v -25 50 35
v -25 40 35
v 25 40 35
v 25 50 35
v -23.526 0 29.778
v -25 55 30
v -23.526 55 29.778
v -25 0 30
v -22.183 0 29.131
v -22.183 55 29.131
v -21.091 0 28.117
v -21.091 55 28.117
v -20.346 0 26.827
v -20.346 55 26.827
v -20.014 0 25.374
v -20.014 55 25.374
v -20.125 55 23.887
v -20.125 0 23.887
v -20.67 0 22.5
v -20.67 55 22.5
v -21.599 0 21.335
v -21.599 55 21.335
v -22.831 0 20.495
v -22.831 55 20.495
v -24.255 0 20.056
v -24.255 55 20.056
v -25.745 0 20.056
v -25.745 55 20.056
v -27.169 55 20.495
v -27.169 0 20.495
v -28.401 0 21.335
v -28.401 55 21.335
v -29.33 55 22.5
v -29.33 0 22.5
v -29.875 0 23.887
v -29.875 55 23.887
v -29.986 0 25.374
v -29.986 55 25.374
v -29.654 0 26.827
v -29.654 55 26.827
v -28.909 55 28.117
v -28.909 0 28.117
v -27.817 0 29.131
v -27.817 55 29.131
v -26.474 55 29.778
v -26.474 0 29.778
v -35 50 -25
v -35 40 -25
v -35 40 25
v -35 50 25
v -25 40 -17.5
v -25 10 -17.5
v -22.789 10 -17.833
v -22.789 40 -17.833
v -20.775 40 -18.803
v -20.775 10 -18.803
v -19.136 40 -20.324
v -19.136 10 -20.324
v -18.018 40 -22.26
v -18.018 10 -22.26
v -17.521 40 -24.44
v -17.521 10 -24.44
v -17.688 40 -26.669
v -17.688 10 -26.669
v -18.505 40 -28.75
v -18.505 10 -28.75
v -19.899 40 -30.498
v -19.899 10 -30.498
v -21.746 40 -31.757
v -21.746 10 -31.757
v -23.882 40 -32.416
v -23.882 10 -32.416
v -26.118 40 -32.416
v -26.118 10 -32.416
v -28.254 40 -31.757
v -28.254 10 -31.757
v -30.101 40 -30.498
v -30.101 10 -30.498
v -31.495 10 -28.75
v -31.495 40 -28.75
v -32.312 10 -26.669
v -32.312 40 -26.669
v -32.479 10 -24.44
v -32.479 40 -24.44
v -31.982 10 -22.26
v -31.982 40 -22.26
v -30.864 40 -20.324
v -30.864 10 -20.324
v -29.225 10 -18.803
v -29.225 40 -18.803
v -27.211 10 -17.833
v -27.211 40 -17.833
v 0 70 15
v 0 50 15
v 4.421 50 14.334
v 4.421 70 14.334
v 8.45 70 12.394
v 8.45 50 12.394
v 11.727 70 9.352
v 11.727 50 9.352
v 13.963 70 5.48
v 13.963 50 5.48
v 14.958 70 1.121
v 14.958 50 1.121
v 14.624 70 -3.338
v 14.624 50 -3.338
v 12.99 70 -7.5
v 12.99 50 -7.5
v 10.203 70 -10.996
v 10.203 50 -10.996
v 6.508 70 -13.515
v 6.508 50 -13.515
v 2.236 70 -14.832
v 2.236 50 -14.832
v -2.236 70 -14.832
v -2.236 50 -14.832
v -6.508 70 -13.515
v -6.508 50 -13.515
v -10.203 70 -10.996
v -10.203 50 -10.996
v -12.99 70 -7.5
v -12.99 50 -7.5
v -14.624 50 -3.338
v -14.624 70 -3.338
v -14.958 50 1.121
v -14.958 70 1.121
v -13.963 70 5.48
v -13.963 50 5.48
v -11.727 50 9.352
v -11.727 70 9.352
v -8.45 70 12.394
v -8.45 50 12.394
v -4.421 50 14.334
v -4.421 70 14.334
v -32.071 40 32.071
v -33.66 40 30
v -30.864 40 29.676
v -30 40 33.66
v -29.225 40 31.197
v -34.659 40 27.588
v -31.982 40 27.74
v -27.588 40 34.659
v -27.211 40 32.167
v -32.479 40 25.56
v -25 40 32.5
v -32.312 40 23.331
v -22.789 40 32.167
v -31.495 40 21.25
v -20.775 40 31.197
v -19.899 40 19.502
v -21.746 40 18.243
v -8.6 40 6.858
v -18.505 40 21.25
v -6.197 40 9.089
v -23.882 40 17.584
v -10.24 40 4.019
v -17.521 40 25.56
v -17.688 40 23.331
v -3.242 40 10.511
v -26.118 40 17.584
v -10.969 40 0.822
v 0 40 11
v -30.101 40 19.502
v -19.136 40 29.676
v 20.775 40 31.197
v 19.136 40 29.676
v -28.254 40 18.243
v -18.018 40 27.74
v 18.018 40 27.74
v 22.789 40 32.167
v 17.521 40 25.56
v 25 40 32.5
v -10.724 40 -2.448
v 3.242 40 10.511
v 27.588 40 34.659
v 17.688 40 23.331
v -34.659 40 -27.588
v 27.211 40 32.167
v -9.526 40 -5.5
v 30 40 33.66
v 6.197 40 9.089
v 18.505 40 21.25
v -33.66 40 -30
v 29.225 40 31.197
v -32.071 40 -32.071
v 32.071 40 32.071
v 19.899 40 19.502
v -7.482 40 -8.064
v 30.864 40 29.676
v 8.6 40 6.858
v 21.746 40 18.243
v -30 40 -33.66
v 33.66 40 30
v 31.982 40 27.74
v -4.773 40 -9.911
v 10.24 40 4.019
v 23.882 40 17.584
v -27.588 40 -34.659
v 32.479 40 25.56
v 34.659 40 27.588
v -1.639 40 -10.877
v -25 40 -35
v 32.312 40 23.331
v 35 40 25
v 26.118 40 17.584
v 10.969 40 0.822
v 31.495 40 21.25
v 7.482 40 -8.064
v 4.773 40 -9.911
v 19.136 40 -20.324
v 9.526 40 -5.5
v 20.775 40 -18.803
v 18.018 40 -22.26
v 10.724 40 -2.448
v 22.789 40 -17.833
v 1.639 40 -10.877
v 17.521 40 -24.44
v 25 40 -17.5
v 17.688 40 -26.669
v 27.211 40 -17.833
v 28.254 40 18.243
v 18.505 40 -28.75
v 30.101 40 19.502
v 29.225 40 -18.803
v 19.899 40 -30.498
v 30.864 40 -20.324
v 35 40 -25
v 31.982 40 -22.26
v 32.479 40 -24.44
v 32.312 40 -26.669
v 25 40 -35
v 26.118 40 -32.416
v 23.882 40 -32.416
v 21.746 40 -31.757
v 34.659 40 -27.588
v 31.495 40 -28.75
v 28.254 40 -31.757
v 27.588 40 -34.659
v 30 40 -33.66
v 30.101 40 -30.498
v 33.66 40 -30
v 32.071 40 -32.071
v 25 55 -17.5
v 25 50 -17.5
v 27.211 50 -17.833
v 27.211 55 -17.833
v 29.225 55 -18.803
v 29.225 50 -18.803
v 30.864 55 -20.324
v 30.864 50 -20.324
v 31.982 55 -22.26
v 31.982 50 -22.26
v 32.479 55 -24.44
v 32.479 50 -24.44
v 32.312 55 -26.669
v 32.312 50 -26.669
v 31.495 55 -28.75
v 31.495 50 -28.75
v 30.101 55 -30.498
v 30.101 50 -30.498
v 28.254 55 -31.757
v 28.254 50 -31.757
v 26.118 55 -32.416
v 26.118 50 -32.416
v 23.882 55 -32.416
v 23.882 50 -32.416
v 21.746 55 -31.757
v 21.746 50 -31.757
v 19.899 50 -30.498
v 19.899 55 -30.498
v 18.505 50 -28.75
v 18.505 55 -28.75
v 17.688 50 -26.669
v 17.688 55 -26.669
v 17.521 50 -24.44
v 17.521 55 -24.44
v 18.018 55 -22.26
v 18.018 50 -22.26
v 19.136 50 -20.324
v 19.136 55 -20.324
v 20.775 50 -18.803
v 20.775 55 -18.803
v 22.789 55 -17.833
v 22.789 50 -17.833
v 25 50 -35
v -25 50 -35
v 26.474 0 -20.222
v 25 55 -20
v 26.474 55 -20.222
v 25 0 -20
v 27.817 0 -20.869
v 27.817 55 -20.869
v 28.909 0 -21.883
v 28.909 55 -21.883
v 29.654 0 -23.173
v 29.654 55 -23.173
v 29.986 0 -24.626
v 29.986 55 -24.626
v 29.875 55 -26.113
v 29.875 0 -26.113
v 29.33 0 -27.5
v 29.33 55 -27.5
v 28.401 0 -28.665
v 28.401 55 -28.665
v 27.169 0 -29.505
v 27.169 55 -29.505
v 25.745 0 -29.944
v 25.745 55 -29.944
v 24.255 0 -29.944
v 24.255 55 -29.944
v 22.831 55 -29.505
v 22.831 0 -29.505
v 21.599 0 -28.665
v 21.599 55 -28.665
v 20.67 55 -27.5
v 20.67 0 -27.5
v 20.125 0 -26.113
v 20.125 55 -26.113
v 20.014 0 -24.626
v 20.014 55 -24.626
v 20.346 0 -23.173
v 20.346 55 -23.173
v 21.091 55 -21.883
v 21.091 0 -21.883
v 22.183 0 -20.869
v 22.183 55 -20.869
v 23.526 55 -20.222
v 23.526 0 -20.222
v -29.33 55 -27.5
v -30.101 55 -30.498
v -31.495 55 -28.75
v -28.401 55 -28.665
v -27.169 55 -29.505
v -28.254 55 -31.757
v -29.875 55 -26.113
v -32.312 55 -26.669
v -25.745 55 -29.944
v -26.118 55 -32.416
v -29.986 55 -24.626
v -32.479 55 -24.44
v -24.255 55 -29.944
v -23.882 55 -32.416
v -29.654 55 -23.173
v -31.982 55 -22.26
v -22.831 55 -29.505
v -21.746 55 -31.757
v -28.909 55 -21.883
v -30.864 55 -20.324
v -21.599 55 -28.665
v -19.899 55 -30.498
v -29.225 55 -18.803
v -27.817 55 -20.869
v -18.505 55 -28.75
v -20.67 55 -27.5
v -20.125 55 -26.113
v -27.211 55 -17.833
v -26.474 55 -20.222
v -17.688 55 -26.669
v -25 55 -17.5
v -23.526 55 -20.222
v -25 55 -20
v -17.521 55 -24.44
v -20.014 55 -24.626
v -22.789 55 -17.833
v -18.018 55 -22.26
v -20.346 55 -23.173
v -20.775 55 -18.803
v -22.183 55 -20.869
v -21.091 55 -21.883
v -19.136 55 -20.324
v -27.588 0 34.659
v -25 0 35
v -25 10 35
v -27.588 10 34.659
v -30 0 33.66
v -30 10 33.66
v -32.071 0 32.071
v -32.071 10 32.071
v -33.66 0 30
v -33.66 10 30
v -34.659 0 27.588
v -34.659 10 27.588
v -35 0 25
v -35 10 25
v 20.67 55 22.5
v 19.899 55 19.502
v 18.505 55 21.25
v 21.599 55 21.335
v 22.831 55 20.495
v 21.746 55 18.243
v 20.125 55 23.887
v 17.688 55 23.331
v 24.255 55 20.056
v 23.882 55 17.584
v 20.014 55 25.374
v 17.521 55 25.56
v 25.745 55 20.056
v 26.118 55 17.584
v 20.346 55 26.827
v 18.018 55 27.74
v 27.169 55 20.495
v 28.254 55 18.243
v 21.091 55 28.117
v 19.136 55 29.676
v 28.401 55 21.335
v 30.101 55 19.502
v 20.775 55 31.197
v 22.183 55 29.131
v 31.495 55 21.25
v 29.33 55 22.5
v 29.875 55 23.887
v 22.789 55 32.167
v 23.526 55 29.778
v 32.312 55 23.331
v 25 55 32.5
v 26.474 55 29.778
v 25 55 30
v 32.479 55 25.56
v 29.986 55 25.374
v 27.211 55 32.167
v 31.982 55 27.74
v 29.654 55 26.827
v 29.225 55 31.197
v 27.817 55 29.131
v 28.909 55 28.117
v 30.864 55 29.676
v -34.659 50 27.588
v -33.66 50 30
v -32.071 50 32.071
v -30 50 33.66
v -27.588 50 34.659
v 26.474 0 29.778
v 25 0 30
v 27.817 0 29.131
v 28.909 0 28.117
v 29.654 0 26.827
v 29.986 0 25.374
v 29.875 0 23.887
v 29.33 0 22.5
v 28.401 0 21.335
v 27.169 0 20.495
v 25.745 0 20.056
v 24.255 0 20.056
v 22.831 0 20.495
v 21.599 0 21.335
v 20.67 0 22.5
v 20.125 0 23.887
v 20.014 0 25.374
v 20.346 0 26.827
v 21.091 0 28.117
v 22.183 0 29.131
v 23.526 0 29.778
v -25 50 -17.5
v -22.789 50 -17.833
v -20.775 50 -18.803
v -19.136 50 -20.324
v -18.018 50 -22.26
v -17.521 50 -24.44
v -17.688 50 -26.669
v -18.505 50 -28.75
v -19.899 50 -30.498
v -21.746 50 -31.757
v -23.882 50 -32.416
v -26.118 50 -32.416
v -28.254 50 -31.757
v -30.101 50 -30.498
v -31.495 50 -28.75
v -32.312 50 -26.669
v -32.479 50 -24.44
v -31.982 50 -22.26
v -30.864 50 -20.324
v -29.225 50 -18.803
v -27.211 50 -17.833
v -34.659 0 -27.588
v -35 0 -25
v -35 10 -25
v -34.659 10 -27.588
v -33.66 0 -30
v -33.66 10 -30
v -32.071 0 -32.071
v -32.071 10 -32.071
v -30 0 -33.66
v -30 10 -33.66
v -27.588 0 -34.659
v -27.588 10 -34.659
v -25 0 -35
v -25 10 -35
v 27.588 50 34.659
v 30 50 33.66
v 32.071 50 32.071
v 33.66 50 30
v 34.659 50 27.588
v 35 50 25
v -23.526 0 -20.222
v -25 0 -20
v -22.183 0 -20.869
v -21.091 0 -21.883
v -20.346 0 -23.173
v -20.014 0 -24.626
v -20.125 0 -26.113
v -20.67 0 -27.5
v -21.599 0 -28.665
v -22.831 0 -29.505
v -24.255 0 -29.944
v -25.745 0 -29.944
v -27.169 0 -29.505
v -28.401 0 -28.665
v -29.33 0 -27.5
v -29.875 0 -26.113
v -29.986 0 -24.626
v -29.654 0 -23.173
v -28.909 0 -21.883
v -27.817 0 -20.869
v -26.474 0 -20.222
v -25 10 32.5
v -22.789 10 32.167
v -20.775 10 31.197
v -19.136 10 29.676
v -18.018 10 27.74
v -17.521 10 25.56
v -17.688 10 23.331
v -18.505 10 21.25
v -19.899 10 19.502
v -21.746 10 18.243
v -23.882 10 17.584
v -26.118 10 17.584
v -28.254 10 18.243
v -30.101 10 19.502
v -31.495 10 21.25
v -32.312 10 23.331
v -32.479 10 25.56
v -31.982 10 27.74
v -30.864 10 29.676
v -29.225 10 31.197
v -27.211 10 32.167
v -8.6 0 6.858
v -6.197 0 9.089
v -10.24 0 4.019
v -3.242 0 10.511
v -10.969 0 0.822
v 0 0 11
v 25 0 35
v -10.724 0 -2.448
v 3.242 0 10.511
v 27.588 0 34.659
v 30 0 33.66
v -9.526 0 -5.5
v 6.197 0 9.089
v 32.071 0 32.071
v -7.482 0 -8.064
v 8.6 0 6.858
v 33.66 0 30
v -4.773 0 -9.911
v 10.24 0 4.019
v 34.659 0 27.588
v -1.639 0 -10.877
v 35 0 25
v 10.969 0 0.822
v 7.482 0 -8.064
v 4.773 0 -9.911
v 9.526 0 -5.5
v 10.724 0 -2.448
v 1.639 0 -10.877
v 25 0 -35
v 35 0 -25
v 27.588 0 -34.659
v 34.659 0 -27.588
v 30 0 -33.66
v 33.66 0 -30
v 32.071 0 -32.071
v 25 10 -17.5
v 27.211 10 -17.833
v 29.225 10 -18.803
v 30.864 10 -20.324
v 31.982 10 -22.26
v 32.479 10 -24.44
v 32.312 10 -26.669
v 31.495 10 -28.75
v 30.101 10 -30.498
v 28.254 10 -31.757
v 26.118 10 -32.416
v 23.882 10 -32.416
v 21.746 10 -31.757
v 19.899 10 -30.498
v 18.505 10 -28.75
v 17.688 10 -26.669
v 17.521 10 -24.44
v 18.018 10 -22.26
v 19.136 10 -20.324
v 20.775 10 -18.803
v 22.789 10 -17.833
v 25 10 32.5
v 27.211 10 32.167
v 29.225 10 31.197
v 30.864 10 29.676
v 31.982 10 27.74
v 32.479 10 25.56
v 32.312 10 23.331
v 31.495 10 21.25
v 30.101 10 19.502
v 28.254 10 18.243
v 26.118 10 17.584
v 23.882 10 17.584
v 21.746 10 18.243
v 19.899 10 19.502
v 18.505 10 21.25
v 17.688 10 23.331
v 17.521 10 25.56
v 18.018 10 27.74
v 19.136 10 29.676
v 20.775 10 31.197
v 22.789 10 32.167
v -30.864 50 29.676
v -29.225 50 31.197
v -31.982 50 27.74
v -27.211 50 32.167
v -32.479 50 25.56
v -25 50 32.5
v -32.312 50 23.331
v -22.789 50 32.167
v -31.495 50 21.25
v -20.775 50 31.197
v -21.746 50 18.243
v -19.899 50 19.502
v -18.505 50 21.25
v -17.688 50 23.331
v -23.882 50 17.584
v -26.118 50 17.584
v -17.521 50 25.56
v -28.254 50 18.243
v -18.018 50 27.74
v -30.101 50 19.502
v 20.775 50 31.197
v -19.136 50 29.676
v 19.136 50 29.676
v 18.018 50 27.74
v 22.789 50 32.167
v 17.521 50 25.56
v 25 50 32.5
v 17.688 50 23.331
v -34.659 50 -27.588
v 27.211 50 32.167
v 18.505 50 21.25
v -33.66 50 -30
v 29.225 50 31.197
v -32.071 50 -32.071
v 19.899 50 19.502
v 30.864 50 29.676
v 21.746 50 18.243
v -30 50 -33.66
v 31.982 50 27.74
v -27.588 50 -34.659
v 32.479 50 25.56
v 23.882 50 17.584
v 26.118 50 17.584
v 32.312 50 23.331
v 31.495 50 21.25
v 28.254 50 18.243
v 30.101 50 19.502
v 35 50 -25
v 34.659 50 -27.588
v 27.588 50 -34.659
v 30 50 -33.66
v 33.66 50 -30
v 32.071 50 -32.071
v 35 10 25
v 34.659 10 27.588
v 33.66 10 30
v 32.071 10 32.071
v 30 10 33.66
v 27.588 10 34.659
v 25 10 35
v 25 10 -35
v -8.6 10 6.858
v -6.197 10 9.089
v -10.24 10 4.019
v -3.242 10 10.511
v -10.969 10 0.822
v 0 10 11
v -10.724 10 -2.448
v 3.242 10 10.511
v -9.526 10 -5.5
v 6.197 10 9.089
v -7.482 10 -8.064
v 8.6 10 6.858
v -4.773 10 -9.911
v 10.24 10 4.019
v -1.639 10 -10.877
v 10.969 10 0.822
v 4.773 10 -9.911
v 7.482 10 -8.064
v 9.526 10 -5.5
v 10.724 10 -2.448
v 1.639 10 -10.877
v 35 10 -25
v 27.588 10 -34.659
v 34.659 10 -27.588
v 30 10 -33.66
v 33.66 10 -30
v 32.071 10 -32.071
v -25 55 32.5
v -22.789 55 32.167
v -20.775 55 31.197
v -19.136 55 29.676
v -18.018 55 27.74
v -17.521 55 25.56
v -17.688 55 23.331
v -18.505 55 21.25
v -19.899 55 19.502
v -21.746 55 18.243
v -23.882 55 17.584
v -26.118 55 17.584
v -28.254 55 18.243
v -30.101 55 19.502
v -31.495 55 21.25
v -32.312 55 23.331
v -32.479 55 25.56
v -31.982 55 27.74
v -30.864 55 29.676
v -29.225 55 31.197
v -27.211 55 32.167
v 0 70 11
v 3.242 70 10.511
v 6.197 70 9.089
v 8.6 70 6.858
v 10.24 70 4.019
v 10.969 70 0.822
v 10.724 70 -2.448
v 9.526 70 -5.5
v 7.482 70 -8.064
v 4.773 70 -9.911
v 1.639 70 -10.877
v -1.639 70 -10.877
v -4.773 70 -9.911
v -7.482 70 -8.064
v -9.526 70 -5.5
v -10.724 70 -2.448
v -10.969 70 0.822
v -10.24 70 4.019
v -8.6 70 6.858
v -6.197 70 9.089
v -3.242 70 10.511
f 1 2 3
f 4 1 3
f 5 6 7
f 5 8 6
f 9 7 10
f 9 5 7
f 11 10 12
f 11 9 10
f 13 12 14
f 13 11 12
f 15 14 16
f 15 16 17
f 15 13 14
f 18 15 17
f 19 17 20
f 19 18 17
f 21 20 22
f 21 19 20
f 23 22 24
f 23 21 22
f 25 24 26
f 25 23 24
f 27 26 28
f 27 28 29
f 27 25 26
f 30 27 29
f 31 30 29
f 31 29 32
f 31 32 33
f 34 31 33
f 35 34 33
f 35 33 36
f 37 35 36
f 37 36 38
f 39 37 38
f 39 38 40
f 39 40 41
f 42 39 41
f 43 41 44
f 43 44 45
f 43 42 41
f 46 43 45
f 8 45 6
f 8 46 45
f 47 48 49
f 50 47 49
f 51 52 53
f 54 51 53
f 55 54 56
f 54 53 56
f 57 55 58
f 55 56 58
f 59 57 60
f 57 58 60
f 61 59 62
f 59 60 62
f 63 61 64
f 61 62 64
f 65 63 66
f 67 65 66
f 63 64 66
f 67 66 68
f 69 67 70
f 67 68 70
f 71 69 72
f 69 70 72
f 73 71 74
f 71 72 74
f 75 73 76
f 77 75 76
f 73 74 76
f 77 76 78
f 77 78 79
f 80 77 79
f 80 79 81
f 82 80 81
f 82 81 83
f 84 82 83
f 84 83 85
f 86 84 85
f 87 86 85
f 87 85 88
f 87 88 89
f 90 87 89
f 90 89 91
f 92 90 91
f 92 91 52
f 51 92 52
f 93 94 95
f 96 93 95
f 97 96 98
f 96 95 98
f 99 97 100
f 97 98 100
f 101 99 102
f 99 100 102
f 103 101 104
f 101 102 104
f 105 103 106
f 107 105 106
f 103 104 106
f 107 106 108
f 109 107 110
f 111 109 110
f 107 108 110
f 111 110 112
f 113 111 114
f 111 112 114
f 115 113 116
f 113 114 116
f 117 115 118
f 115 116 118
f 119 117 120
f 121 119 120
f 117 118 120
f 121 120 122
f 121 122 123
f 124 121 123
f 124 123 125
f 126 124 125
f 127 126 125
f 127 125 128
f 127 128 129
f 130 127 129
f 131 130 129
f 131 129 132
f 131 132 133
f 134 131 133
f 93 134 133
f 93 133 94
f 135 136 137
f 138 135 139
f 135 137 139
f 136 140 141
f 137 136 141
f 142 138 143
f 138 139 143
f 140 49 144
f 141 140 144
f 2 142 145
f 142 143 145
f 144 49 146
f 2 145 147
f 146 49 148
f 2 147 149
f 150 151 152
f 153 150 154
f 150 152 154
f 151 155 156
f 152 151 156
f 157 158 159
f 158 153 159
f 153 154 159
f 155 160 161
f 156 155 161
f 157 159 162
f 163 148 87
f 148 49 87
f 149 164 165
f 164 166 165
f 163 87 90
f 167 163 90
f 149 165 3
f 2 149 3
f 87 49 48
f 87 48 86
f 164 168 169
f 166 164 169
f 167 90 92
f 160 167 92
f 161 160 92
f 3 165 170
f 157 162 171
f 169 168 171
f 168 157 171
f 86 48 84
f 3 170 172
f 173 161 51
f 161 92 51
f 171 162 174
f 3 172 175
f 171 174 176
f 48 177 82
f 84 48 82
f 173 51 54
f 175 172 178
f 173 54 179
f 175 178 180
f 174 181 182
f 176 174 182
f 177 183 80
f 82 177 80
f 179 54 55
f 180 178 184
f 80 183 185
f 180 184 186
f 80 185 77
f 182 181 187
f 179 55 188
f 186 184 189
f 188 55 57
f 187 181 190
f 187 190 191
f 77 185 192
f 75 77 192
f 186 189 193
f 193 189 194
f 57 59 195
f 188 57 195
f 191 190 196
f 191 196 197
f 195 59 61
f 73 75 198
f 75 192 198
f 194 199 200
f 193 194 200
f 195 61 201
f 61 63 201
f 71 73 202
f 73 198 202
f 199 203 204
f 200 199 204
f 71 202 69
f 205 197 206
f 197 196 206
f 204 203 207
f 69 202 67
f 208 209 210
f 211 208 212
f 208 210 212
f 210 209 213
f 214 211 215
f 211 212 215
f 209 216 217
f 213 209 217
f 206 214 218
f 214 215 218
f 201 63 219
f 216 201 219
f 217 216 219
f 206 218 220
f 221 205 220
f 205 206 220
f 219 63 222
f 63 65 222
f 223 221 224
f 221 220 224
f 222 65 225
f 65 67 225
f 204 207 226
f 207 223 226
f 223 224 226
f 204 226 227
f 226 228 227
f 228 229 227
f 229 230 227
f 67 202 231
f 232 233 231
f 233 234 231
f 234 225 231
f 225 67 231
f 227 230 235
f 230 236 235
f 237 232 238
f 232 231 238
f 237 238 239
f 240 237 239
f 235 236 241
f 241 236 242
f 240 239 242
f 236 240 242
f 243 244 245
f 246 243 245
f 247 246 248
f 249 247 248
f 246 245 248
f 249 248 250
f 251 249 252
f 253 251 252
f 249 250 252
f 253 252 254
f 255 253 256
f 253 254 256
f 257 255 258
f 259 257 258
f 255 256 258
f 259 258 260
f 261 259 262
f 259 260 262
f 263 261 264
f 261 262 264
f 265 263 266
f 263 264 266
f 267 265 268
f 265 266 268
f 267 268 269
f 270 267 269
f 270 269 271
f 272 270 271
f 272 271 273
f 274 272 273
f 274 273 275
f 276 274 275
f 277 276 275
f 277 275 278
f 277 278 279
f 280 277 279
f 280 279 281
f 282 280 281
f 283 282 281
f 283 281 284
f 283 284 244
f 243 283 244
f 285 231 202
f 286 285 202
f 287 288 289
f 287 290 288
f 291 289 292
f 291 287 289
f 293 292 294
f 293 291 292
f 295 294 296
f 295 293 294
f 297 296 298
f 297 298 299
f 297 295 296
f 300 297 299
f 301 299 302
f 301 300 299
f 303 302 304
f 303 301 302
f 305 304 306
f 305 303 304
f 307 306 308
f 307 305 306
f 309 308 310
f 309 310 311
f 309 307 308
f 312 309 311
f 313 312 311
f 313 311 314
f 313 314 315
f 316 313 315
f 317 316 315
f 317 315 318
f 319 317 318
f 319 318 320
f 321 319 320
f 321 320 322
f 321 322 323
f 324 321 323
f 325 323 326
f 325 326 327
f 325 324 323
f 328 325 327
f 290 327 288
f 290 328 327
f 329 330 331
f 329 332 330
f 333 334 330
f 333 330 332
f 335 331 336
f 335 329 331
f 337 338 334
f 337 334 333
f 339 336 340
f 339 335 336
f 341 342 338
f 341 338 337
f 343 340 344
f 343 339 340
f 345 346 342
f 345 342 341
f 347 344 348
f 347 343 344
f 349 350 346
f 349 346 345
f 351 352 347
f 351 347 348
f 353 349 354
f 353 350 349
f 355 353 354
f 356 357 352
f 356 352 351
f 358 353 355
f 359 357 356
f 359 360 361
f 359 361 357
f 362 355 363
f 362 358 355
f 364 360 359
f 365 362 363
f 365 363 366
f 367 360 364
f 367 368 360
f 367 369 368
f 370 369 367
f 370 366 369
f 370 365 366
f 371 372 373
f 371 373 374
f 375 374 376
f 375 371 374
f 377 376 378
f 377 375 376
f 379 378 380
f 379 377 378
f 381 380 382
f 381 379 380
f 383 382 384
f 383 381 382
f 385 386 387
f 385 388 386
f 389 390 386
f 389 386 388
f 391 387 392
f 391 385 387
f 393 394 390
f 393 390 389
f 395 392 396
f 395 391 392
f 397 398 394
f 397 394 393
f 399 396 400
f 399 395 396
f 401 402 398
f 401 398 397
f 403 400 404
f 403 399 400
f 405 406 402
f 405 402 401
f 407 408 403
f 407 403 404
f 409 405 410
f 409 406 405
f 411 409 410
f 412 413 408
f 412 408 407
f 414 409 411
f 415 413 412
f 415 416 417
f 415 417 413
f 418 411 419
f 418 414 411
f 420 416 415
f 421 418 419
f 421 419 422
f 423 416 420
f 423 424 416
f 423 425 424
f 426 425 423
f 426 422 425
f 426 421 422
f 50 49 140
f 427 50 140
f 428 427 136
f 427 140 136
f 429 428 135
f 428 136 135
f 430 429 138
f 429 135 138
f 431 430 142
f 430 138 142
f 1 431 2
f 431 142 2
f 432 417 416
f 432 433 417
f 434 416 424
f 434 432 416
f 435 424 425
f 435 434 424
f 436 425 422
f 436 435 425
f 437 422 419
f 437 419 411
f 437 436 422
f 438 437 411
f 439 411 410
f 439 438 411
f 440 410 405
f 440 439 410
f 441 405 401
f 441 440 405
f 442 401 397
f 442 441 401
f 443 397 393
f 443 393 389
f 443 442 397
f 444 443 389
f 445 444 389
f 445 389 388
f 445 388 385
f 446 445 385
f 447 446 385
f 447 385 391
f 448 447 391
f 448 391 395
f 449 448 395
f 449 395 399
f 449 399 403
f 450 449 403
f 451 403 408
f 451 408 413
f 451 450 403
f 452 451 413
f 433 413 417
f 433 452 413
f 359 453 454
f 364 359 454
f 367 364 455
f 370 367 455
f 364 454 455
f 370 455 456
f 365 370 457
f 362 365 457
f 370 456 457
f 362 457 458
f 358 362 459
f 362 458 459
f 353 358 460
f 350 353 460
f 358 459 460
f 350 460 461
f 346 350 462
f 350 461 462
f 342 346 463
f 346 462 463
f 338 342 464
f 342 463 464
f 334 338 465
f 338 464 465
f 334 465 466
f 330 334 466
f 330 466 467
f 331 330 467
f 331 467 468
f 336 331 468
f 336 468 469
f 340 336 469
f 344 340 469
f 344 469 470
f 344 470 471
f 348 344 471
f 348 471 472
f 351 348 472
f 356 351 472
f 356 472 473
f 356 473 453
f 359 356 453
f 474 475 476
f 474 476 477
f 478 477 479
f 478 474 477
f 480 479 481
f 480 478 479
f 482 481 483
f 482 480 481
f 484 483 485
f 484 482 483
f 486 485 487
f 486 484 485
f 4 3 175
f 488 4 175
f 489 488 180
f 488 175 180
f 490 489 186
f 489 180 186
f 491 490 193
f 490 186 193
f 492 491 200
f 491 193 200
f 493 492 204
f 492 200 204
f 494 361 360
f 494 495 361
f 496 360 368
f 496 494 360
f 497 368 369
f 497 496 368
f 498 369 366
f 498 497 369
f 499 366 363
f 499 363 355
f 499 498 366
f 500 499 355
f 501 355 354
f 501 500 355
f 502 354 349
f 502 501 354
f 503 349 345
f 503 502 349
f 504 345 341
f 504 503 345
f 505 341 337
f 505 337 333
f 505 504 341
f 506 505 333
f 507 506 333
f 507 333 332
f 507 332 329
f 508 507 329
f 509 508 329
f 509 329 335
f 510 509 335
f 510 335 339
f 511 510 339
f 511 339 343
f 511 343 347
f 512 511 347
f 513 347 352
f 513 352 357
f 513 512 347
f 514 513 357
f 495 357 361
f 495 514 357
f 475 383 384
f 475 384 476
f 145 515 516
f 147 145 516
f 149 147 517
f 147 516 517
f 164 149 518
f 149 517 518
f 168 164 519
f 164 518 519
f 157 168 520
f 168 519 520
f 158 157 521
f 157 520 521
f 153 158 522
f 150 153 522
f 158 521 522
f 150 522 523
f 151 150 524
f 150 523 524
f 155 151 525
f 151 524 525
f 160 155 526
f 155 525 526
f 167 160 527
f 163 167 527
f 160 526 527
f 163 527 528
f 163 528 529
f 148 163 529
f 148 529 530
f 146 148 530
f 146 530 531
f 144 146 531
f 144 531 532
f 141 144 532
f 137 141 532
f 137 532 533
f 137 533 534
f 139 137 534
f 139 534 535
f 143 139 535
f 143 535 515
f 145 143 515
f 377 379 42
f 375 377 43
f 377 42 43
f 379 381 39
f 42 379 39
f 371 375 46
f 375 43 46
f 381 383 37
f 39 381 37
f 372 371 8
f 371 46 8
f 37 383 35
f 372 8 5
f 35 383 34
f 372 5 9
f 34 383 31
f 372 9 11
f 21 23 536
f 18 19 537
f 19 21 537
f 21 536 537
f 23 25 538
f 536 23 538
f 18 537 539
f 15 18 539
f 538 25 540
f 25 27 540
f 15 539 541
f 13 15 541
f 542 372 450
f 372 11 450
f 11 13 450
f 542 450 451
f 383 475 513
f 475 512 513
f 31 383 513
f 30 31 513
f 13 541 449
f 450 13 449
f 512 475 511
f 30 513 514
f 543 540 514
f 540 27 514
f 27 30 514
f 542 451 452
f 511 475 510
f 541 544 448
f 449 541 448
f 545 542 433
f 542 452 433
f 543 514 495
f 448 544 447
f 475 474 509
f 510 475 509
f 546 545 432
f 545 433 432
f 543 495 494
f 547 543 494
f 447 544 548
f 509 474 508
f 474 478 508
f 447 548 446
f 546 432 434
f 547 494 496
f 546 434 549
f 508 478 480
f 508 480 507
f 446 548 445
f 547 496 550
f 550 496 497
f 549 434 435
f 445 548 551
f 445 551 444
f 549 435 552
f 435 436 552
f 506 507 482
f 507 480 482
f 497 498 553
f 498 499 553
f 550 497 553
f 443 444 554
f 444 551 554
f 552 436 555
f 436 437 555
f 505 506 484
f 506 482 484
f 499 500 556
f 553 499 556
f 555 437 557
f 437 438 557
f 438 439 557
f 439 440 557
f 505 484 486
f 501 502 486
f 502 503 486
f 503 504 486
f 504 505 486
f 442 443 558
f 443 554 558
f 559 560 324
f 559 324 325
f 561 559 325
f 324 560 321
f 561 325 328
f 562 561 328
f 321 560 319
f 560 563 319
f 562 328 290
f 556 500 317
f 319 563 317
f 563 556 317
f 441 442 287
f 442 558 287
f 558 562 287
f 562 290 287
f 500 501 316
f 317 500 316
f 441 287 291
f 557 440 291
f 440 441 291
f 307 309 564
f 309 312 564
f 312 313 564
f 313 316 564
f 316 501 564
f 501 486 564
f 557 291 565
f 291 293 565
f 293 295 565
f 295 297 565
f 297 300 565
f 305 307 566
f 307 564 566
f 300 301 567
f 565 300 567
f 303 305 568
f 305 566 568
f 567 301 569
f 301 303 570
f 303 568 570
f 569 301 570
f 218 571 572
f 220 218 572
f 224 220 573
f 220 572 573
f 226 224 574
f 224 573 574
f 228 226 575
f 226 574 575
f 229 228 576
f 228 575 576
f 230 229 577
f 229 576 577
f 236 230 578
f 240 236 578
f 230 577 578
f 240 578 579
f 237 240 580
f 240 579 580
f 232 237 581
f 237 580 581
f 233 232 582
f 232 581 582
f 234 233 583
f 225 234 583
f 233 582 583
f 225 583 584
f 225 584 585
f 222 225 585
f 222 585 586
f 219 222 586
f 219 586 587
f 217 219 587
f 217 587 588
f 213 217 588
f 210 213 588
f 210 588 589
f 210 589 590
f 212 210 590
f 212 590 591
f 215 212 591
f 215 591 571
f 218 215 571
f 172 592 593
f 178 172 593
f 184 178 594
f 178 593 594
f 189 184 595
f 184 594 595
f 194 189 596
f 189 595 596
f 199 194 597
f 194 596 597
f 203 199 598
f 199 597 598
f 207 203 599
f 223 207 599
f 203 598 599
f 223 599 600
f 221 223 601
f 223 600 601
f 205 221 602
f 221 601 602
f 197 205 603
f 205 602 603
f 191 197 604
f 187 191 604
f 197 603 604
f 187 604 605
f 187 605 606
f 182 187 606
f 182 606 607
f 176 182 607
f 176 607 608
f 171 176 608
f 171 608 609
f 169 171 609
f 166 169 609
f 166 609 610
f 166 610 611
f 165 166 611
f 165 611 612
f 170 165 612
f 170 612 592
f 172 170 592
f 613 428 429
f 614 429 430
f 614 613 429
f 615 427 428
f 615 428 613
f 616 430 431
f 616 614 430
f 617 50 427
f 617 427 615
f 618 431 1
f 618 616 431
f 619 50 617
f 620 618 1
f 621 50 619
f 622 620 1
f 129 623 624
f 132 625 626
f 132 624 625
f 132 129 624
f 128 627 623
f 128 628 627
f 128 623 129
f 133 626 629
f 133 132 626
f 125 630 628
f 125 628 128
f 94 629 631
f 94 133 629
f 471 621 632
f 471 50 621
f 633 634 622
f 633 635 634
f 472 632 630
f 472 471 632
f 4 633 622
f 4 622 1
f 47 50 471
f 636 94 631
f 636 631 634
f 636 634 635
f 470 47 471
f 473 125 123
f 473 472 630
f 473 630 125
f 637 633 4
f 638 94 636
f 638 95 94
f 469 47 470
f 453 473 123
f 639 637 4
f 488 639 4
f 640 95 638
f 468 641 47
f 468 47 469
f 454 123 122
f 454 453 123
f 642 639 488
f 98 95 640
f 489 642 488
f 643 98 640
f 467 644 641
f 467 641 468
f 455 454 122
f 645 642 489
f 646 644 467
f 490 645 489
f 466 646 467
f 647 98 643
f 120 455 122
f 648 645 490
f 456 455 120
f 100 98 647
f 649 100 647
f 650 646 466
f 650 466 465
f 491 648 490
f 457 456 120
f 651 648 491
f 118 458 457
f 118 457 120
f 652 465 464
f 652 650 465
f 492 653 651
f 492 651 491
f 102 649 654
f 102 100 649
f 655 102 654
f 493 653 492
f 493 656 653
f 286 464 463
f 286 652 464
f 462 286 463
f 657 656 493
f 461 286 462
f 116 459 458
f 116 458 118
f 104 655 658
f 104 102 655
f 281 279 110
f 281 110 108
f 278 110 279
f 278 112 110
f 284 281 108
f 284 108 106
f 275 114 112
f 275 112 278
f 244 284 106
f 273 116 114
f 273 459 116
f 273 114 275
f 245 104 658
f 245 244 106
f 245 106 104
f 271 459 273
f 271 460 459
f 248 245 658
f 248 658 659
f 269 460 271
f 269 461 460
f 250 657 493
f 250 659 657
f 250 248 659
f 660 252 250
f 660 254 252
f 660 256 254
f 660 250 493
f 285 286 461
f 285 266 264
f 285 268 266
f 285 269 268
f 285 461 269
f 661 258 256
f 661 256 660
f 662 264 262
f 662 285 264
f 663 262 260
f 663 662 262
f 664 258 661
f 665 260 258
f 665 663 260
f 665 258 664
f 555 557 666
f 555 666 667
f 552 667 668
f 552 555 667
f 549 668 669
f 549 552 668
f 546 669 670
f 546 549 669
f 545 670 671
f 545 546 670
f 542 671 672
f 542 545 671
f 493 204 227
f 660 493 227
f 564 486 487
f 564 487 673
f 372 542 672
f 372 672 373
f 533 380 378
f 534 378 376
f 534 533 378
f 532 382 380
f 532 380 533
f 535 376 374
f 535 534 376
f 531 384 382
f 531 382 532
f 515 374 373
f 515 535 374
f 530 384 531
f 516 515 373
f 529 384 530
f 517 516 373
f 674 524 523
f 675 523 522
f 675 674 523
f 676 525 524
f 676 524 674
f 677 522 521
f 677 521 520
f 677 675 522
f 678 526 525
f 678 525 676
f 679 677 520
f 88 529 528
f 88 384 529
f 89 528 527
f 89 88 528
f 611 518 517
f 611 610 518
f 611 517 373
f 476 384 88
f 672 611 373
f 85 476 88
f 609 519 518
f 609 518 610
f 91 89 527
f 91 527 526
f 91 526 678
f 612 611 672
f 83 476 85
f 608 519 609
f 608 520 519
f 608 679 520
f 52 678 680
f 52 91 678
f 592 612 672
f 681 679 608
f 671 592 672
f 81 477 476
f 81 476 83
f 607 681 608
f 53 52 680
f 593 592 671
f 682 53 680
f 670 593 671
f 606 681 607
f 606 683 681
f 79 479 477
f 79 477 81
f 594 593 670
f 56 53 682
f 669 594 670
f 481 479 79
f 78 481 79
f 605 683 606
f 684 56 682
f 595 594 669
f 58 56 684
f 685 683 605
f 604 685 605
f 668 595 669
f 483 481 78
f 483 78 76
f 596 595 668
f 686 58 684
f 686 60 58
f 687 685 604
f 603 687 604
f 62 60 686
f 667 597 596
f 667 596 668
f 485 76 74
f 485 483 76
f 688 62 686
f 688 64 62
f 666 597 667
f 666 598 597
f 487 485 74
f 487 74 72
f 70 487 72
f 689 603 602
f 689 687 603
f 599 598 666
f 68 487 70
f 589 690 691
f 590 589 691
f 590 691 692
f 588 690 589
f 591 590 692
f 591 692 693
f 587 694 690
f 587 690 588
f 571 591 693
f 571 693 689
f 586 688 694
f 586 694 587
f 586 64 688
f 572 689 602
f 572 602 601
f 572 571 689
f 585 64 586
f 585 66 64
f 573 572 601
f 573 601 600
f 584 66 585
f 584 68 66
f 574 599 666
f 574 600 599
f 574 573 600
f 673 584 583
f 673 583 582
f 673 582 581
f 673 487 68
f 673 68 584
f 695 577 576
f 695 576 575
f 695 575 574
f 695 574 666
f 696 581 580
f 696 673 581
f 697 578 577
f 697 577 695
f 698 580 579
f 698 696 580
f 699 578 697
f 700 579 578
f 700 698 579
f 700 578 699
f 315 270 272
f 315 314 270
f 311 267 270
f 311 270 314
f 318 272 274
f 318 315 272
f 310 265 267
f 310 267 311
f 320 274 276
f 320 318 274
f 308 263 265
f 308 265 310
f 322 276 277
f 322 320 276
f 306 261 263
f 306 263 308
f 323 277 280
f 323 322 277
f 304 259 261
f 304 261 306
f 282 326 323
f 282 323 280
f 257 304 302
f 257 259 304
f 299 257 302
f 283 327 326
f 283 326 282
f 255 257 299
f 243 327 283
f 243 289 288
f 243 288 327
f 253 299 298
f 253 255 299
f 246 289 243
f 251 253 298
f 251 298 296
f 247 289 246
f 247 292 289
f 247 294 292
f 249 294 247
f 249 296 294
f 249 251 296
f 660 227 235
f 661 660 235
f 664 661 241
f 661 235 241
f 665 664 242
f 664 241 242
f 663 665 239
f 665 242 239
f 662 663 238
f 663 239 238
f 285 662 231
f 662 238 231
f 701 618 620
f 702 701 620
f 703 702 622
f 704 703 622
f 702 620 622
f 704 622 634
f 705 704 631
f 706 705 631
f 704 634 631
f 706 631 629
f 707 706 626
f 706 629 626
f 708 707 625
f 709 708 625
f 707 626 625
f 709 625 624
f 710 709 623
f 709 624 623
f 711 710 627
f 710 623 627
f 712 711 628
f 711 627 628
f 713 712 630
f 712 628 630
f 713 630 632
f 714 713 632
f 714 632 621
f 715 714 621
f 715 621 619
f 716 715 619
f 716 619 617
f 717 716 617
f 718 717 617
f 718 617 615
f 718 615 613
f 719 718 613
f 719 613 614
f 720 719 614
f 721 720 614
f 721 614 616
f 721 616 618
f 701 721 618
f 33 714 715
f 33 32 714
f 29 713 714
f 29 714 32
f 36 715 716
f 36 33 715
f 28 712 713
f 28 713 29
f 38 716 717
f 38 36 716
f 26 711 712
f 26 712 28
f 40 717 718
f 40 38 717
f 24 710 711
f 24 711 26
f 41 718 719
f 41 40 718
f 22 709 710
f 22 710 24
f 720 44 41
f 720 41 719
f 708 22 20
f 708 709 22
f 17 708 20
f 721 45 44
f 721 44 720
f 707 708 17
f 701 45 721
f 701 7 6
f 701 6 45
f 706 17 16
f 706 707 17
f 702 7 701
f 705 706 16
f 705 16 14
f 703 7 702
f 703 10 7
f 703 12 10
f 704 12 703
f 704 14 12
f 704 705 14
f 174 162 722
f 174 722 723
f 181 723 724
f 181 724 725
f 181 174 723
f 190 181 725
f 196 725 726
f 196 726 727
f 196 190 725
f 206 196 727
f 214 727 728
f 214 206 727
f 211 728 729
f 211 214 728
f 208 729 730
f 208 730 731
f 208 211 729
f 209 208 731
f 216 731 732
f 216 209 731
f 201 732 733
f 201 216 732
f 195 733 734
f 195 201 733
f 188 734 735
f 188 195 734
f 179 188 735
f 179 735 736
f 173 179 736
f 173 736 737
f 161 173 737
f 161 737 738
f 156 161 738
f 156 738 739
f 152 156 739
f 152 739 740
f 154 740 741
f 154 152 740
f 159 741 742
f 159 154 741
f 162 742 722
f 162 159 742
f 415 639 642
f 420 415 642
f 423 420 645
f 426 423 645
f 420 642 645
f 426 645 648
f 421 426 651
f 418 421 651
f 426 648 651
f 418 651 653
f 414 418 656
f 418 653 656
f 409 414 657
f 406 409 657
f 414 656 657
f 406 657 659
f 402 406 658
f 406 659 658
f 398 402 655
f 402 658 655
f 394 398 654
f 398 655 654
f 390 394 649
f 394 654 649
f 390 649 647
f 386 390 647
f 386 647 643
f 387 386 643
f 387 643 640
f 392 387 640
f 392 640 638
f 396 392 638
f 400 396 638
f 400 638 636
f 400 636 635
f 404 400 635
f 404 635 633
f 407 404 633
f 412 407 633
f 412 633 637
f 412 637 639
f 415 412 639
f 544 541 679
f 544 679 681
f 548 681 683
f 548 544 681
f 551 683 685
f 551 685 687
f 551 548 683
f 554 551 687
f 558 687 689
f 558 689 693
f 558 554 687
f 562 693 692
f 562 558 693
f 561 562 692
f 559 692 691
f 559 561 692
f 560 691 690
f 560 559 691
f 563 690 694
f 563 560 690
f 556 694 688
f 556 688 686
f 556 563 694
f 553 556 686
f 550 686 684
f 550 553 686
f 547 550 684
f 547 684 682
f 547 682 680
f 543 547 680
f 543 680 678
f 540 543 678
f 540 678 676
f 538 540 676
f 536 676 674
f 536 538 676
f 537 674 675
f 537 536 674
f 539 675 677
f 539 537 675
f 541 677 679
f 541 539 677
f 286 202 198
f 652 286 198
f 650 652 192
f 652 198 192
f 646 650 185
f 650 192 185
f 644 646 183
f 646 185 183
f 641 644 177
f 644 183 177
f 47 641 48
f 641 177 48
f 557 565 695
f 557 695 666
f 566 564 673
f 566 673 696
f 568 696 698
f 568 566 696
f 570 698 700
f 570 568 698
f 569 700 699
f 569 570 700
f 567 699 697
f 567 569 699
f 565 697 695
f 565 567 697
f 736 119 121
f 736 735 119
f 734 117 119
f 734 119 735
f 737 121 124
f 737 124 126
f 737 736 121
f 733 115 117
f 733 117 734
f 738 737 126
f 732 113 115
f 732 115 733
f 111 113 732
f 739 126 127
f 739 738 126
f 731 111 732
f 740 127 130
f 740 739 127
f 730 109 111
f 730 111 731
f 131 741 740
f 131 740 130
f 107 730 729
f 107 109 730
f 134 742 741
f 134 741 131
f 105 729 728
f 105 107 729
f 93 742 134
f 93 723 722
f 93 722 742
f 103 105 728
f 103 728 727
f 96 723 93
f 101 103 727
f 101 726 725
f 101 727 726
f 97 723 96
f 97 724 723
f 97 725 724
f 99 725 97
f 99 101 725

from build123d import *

# Parameters (mm, degrees)
SKETCH1_R           = 5
SKETCH1_R_2         = 11
BOSS_EXTRUDE1_DEPTH = 10
SKETCH1_5_R         = 7.5
SKETCH1_5_R_2       = 5
BOSS_EXTRUDE2_DEPTH = 40
SKETCH2_R           = 7.5
SKETCH2_R_2         = 15
BOSS_EXTRUDE5_DEPTH = 10
SKETCH2_6_R         = 7.5
SKETCH2_6_R_2       = 5
BOSS_EXTRUDE6_DEPTH = 15
SKETCH2_7_R         = 15
SKETCH2_7_R_2       = 11
BOSS_EXTRUDE7_DEPTH = 30


with BuildPart() as part:
    # Sketch1 → Boss-Extrude1 (new body)
    with BuildSketch(Plane(origin=(0, 0, 0), x_dir=(1, 0, 0), z_dir=(0, 1, 0))):
        with BuildLine():
            Line((25, 35), (-25, 35))
            ThreePointArc((-25, 35), (-32.071067812, 32.071067812), (-35, 25))
            Line((-35, 25), (-35, -25))
            ThreePointArc((-35, -25), (-32.071067812, -32.071067812), (-25, -35))
            Line((-25, -35), (25, -35))
            ThreePointArc((25, -35), (32.071067812, -32.071067812), (35, -25))
            Line((35, -25), (35, 25))
            ThreePointArc((35, 25), (32.071067812, 32.071067812), (25, 35))
        make_face()
        with Locations((-25, -25)):
            Circle(SKETCH1_R, mode=Mode.SUBTRACT)
        with Locations((25, -25)):
            Circle(SKETCH1_R, mode=Mode.SUBTRACT)
        with Locations((-25, 25)):
            Circle(SKETCH1_R, mode=Mode.SUBTRACT)
        Circle(SKETCH1_R_2, mode=Mode.SUBTRACT)
        with Locations((25, 25)):
            Circle(SKETCH1_R, mode=Mode.SUBTRACT)
    extrude(amount=BOSS_EXTRUDE1_DEPTH)

    # Sketch1<5> → Boss-Extrude2 (add)
    # profile 1 of 4: a face of its own
    with BuildSketch(Plane(origin=(0, 0, 0), x_dir=(1, 0, 0), z_dir=(0, 1, 0))):
        with Locations((-25, 25)):
            Circle(SKETCH1_5_R)
        with Locations((-25, 25)):
            Circle(SKETCH1_5_R_2, mode=Mode.SUBTRACT)
    # profile 2 of 4: a face of its own
    with BuildSketch(Plane(origin=(0, 0, 0), x_dir=(1, 0, 0), z_dir=(0, 1, 0))):
        with Locations((25, 25)):
            Circle(SKETCH1_5_R)
        with Locations((25, 25)):
            Circle(SKETCH1_5_R_2, mode=Mode.SUBTRACT)
    # profile 3 of 4: a face of its own
    with BuildSketch(Plane(origin=(0, 0, 0), x_dir=(1, 0, 0), z_dir=(0, 1, 0))):
        with Locations((25, -25)):
            Circle(SKETCH1_5_R)
        with Locations((25, -25)):
            Circle(SKETCH1_5_R_2, mode=Mode.SUBTRACT)
    # profile 4 of 4: a face of its own
    with BuildSketch(Plane(origin=(0, 0, 0), x_dir=(1, 0, 0), z_dir=(0, 1, 0))):
        with Locations((-25, -25)):
            Circle(SKETCH1_5_R)
        with Locations((-25, -25)):
            Circle(SKETCH1_5_R_2, mode=Mode.SUBTRACT)
    extrude(amount=BOSS_EXTRUDE2_DEPTH)



with BuildPart() as body_2:
    # Sketch2 → Boss-Extrude5 (new body)
    with BuildSketch(Plane(origin=(0, 40, 0), x_dir=(1, 0, 0), z_dir=(0, 1, 0))):
        with BuildLine():
            ThreePointArc((35, 25), (32.071067812, 32.071067812), (25, 35))
            Line((25, 35), (-25, 35))
            ThreePointArc((-25, 35), (-32.071067812, 32.071067812), (-35, 25))
            Line((-35, 25), (-35, -25))
            ThreePointArc((-35, -25), (-32.071067812, -32.071067812), (-25, -35))
            Line((-25, -35), (25, -35))
            ThreePointArc((25, -35), (32.071067812, -32.071067812), (35, -25))
            Line((35, -25), (35, 25))
        make_face()
        with Locations((-25, -25)):
            Circle(SKETCH2_R, mode=Mode.SUBTRACT)
        with Locations((25, -25)):
            Circle(SKETCH2_R, mode=Mode.SUBTRACT)
        with Locations((-25, 25)):
            Circle(SKETCH2_R, mode=Mode.SUBTRACT)
        Circle(SKETCH2_R_2, mode=Mode.SUBTRACT)
        with Locations((25, 25)):
            Circle(SKETCH2_R, mode=Mode.SUBTRACT)
    extrude(amount=BOSS_EXTRUDE5_DEPTH)


with BuildPart() as part_1:
    add(part.part)

    add(body_2.part)  # Boss-Extrude6 merges body 2
    # Sketch2<6> → Boss-Extrude6 (add)
    # profile 1 of 4: a face of its own
    with BuildSketch(Plane(origin=(0, 40, 0), x_dir=(1, 0, 0), z_dir=(0, 1, 0))):
        with Locations((25, 25)):
            Circle(SKETCH2_6_R)
        with Locations((25, 25)):
            Circle(SKETCH2_6_R_2, mode=Mode.SUBTRACT)
    # profile 2 of 4: a face of its own
    with BuildSketch(Plane(origin=(0, 40, 0), x_dir=(1, 0, 0), z_dir=(0, 1, 0))):
        with Locations((25, -25)):
            Circle(SKETCH2_6_R)
        with Locations((25, -25)):
            Circle(SKETCH2_6_R_2, mode=Mode.SUBTRACT)
    # profile 3 of 4: a face of its own
    with BuildSketch(Plane(origin=(0, 40, 0), x_dir=(1, 0, 0), z_dir=(0, 1, 0))):
        with Locations((-25, -25)):
            Circle(SKETCH2_6_R)
        with Locations((-25, -25)):
            Circle(SKETCH2_6_R_2, mode=Mode.SUBTRACT)
    # profile 4 of 4: a face of its own
    with BuildSketch(Plane(origin=(0, 40, 0), x_dir=(1, 0, 0), z_dir=(0, 1, 0))):
        with Locations((-25, 25)):
            Circle(SKETCH2_6_R)
        with Locations((-25, 25)):
            Circle(SKETCH2_6_R_2, mode=Mode.SUBTRACT)
    extrude(amount=BOSS_EXTRUDE6_DEPTH)

    # Sketch2<7> → Boss-Extrude7 (add)
    with BuildSketch(Plane(origin=(0, 40, 0), x_dir=(1, 0, 0), z_dir=(0, 1, 0))):
        Circle(SKETCH2_7_R)
        Circle(SKETCH2_7_R_2, mode=Mode.SUBTRACT)
    extrude(amount=BOSS_EXTRUDE7_DEPTH)


solid = part_1.part
